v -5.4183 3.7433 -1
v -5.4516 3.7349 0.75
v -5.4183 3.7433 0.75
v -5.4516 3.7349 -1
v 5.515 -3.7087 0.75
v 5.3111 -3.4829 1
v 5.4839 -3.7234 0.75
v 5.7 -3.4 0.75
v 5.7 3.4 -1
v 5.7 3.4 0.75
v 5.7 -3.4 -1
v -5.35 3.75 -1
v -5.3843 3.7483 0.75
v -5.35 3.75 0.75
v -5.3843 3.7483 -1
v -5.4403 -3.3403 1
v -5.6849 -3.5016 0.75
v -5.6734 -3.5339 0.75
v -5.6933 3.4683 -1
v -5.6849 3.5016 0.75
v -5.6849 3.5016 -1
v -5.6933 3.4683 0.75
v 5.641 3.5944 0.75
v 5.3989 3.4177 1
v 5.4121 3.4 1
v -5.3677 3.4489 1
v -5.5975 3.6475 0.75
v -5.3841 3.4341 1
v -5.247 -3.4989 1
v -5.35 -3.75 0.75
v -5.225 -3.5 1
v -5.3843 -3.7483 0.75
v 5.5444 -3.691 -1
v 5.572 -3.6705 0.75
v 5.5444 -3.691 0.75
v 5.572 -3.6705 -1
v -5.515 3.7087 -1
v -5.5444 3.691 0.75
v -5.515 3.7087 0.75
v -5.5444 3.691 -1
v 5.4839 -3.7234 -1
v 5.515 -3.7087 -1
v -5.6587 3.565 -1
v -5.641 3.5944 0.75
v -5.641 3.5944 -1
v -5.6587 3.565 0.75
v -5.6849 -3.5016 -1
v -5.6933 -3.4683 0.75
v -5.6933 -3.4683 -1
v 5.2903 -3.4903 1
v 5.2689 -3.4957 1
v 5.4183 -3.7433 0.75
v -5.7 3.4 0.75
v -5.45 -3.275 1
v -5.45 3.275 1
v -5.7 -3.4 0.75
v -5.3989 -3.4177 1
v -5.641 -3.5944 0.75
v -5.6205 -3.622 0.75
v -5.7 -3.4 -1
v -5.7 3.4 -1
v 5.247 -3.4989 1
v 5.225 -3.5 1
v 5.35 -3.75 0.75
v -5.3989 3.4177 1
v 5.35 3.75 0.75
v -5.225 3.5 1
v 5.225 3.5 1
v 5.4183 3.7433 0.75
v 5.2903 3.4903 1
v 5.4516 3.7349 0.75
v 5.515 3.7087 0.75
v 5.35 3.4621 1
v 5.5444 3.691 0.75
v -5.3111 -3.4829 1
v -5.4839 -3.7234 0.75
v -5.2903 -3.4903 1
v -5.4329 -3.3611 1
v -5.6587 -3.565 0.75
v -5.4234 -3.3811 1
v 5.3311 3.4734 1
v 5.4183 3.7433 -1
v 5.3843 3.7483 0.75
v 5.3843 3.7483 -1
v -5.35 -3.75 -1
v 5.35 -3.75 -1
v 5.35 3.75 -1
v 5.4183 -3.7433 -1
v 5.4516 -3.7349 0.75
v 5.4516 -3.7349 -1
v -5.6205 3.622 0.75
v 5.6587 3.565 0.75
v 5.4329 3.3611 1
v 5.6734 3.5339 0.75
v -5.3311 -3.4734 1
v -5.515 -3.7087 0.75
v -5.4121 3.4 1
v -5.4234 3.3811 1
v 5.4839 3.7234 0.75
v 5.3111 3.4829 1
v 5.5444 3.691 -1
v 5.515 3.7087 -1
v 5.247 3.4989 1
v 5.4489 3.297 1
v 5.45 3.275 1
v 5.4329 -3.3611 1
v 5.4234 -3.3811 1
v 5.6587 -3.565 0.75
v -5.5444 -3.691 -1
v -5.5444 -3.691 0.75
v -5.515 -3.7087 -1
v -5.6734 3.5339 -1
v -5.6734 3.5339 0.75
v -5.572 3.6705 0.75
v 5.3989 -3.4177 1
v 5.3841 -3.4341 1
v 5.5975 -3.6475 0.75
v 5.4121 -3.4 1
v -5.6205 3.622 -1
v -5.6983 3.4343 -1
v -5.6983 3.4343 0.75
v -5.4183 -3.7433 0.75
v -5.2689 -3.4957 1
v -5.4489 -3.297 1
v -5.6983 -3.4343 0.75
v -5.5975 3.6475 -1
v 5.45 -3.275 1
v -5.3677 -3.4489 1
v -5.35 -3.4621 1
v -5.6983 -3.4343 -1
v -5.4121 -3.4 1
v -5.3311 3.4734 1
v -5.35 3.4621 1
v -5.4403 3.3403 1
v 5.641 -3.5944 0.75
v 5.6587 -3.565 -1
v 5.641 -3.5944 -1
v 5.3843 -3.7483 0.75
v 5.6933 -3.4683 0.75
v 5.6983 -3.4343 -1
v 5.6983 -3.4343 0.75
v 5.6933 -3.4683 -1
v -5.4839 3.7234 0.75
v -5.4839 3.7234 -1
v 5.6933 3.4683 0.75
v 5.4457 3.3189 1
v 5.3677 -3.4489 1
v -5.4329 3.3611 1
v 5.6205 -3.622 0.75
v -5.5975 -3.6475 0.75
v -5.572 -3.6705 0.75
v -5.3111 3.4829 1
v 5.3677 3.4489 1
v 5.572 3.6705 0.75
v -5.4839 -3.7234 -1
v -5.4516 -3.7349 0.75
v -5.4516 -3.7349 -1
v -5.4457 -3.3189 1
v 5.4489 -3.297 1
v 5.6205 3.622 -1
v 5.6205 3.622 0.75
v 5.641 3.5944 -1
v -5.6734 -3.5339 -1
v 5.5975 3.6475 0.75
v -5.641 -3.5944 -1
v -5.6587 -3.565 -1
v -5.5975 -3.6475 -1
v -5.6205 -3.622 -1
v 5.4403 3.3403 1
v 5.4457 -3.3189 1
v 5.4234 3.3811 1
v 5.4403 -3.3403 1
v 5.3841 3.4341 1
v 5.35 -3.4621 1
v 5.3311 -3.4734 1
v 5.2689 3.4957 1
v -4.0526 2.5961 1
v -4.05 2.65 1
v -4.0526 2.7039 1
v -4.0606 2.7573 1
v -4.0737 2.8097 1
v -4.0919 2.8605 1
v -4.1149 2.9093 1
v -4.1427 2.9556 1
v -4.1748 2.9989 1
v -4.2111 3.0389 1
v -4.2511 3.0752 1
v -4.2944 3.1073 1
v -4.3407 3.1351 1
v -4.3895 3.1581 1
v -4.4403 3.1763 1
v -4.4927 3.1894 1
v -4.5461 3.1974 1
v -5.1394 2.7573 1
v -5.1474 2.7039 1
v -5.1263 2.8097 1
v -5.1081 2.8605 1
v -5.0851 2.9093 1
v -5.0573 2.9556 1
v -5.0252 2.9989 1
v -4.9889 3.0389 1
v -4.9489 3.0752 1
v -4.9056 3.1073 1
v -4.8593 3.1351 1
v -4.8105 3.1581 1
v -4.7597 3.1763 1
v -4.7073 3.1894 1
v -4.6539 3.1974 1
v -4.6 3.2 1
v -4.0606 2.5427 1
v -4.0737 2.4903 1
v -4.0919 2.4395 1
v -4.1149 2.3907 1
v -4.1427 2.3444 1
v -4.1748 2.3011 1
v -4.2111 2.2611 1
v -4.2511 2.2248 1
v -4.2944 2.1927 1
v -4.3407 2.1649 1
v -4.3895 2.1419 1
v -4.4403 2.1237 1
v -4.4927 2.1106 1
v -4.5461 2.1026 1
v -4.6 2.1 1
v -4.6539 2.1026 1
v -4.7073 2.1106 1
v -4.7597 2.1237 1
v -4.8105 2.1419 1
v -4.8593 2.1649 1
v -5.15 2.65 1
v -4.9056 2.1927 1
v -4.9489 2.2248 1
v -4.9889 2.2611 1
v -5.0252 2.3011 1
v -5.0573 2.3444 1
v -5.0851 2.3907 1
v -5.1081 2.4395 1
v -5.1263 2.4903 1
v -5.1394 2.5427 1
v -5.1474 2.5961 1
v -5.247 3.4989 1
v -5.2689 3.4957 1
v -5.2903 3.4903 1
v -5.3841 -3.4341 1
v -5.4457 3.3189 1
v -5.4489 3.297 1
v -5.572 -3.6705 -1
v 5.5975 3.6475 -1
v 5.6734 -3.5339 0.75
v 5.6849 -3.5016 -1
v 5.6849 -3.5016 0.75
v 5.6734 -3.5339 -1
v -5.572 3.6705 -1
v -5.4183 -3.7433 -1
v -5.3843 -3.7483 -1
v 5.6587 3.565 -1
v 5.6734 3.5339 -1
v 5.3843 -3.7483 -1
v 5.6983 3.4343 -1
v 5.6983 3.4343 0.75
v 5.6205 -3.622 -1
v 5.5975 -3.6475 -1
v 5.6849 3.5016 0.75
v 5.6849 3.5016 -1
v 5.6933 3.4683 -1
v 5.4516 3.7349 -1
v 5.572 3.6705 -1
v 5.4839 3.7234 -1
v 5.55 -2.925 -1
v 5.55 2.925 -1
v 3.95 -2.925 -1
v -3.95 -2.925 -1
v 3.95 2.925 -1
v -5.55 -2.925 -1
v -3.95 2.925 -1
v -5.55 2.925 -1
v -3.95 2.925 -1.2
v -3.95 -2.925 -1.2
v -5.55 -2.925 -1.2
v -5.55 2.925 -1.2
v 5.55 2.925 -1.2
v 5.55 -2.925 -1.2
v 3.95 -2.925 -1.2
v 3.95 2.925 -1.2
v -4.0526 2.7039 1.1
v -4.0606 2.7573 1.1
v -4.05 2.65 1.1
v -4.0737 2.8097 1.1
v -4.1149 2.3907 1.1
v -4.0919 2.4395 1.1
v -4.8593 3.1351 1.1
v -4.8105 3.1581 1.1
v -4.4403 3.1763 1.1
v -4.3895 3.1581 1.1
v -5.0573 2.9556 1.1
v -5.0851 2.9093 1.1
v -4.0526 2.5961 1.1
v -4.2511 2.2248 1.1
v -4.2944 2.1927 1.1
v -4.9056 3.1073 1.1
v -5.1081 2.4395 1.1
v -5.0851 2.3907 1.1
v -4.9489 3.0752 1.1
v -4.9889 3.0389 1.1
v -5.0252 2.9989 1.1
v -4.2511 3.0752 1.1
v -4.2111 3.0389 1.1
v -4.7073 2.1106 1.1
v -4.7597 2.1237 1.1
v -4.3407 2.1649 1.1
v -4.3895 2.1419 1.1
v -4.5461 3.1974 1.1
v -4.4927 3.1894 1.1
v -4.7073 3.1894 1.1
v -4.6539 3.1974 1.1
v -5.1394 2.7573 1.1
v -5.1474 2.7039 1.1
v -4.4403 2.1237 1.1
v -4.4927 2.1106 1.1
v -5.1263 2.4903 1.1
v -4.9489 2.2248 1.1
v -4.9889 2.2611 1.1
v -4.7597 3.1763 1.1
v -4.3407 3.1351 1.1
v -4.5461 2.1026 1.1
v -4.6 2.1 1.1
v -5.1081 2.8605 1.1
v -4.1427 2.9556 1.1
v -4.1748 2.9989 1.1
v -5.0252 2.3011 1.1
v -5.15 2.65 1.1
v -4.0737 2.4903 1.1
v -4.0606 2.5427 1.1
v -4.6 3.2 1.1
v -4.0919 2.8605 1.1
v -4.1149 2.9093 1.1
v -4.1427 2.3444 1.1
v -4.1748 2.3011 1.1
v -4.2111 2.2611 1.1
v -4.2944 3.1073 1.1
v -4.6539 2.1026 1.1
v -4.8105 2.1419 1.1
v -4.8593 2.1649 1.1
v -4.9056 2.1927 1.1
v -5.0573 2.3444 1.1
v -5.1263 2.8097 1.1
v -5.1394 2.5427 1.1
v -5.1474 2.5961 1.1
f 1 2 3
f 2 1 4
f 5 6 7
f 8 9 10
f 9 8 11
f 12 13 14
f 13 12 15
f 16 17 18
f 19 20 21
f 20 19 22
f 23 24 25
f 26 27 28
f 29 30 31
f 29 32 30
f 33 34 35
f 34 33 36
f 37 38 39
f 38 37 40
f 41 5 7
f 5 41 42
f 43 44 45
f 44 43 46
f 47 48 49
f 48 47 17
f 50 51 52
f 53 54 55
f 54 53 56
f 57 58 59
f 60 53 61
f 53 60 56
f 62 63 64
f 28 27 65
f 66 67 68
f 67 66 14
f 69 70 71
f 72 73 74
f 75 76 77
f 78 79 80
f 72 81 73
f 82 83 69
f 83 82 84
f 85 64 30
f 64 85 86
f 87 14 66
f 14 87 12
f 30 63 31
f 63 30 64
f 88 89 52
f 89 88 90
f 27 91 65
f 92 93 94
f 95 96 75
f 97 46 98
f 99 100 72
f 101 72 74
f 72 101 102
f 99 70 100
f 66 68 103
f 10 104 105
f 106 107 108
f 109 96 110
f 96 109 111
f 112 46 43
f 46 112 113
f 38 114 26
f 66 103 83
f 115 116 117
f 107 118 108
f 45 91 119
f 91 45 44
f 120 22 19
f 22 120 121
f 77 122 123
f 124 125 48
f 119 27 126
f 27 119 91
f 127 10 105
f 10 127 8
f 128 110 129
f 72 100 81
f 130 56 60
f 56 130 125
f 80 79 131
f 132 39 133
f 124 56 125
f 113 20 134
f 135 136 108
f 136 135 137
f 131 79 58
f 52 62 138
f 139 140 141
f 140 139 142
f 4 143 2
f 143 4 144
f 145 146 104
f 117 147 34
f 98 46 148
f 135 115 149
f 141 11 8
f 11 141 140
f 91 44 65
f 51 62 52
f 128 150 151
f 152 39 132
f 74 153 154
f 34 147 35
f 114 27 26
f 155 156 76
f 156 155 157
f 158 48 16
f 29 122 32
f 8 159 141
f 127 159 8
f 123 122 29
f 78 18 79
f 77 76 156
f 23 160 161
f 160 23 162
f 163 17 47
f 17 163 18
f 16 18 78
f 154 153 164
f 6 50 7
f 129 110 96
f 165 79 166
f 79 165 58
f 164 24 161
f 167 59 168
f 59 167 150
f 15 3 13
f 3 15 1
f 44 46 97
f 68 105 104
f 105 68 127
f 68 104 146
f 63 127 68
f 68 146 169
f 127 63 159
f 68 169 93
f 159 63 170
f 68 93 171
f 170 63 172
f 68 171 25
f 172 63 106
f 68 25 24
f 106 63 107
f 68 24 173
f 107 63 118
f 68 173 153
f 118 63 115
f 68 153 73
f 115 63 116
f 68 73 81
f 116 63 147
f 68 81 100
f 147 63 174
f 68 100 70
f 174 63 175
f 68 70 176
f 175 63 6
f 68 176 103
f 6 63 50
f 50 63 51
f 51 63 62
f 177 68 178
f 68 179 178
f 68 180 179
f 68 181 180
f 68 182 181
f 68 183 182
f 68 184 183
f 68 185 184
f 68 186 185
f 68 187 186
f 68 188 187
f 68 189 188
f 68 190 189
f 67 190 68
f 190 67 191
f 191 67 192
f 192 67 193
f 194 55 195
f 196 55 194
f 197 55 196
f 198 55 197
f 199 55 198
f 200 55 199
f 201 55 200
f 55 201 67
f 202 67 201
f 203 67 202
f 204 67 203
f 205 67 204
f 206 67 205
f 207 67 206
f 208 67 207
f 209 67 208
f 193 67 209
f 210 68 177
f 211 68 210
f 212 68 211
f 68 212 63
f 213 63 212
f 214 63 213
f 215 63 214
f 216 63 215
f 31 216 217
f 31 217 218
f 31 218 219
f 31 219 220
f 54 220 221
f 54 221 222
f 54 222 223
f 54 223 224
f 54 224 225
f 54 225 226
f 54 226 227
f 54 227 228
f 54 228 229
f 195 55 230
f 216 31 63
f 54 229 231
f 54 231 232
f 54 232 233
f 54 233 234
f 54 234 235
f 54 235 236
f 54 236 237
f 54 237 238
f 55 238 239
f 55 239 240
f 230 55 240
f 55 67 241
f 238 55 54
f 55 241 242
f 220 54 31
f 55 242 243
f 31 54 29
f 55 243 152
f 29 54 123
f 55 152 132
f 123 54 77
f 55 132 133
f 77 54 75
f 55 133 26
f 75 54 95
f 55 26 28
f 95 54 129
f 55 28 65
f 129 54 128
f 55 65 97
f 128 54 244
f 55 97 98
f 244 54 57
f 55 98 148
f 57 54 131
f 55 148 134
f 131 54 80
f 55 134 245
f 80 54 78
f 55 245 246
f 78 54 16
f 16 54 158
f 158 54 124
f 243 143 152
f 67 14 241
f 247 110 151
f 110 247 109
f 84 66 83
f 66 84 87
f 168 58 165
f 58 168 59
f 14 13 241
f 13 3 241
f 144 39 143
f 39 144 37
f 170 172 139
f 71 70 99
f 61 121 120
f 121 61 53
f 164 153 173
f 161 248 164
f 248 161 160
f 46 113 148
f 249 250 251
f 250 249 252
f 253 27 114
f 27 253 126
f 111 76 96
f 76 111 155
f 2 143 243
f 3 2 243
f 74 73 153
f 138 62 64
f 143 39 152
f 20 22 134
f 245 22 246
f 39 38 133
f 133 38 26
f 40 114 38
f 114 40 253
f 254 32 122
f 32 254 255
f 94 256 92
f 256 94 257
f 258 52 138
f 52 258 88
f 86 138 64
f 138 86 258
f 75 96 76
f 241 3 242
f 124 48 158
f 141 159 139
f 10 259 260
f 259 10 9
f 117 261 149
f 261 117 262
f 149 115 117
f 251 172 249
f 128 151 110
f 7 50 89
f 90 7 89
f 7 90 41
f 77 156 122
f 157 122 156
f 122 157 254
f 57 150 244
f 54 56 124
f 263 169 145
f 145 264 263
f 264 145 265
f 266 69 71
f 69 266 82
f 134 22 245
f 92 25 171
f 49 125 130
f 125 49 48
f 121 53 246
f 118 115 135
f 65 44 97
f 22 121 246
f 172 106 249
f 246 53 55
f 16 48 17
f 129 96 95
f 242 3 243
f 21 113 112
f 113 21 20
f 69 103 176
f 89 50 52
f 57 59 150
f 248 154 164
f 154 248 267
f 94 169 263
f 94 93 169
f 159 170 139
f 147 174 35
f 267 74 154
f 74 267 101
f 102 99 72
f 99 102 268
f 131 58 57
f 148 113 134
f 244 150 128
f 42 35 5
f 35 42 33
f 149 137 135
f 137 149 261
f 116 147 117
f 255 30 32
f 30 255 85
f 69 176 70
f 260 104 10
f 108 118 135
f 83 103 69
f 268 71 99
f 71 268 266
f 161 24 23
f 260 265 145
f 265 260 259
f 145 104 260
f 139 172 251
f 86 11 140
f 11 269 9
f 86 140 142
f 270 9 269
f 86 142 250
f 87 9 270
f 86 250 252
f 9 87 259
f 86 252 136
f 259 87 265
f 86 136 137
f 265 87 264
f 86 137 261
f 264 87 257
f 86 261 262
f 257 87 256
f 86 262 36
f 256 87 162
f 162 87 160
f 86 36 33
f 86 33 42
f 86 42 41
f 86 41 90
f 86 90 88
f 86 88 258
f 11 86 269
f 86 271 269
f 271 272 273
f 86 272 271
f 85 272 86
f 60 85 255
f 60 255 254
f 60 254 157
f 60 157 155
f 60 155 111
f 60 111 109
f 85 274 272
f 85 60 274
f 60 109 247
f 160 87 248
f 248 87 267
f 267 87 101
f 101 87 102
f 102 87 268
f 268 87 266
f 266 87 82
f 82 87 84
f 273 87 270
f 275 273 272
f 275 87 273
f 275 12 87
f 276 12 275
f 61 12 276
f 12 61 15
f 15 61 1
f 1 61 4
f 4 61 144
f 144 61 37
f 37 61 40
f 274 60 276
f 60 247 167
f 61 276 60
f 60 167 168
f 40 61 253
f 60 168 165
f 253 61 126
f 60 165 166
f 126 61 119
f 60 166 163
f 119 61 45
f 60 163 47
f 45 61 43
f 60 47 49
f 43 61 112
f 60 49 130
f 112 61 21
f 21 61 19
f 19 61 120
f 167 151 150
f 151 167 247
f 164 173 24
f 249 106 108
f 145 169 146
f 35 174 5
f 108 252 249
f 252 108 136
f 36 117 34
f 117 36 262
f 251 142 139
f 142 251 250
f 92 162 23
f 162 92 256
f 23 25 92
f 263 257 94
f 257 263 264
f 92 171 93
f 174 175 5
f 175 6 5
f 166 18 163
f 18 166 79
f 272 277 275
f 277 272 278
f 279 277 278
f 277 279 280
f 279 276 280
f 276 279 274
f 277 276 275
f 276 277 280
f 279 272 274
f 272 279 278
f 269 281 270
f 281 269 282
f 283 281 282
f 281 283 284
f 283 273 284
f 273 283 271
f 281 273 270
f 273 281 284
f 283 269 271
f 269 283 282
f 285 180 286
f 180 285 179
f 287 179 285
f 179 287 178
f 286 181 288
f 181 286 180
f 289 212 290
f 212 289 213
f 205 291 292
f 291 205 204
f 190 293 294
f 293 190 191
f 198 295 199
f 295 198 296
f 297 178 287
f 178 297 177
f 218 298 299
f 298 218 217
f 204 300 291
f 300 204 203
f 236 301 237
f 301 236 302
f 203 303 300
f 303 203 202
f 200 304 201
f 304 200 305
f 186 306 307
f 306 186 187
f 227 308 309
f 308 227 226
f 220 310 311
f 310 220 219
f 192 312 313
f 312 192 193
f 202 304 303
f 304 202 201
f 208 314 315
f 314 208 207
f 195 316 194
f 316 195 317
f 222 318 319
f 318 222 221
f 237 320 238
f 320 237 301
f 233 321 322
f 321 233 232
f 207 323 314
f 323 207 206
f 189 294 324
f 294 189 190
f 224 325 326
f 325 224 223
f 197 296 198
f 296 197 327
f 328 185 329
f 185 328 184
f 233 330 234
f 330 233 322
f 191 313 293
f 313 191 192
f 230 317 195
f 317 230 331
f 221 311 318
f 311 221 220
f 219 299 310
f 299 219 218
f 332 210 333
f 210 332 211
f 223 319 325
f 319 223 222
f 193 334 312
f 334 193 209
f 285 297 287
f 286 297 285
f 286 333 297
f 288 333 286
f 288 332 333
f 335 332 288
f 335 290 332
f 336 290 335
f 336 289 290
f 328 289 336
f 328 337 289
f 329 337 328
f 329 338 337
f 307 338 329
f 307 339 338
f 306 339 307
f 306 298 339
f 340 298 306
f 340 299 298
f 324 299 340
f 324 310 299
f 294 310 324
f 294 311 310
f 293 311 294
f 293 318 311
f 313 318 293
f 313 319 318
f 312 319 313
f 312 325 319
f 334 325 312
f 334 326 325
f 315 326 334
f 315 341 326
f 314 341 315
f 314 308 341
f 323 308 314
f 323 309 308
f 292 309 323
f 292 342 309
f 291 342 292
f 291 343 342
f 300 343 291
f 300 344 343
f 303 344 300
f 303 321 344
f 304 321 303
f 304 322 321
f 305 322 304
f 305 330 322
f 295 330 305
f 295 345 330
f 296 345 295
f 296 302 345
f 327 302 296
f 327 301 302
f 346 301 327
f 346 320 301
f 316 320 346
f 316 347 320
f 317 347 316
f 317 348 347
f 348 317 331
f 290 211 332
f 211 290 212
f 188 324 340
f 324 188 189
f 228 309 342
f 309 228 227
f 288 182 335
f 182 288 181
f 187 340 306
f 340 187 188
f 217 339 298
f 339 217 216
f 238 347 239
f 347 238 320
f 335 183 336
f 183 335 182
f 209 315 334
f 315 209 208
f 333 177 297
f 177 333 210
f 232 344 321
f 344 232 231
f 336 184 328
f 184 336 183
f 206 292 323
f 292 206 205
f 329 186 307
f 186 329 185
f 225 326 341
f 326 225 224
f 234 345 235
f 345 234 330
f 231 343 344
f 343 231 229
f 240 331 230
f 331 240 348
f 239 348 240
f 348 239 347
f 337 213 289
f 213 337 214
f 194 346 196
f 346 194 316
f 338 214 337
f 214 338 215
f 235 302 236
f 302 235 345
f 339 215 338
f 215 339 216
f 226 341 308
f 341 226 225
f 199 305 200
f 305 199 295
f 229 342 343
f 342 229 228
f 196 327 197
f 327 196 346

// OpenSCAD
$fn = 64;

// Target overall size (mm)
body_length = 11.40;
body_width  = 7.50;
body_height = 2.00;

// Feature parameters (kept proportional and connected)
edge_round_r   = 0.35;   // corner rounding for body
top_chamfer_h  = 0.25;   // slight top taper
pin1_mark_r    = 0.55;
pin1_mark_h    = 0.18;
pin1_inset_xy  = 1.10;   // from outer edges
overlap        = 0.05;   // small overlap to guarantee single connected solid

// Simple SMD terminals (as bottom pads)
pad_len   = 1.60;
pad_thk   = 0.20;
pad_inset = 0.15;        // inset from body ends

module rounded_box_xy(l, w, h, r) {
    // Rounded rectangle in XY, extruded in Z
    linear_extrude(height=h, center=true)
        offset(r=r)
            square([l - 2*r, w - 2*r], center=true);
}

module smd_body() {
    // Slight top taper via hull of two rounded boxes
    color("DimGray")
    hull() {
        translate([0,0,-top_chamfer_h/2])
            rounded_box_xy(body_length, body_width, body_height - top_chamfer_h, edge_round_r);

        translate([0,0, body_height/2 - top_chamfer_h/2])
            rounded_box_xy(body_length - 2*top_chamfer_h,
                           body_width  - 2*top_chamfer_h,
                           top_chamfer_h,
                           max(0.01, edge_round_r - top_chamfer_h/2));
    }
}

module pad_at_end(sign) { // sign = -1 (left), +1 (right)
    // Pads are connected to body by slight overlap into the body bottom
    color("Silver")
    translate([
        sign * (body_length/2 - pad_inset - pad_len/2),
        0,
        -body_height/2 - pad_thk/2 + overlap
    ])
        cube([pad_len, body_width*0.78, pad_thk + 2*overlap], center=true);
}

module pin1_mark() {
    // Small top mark near one corner, connected with overlap
    color("Silver")
    translate([
        -body_length/2 + pin1_inset_xy,
         body_width/2  - pin1_inset_xy,
         body_height/2 - pin1_mark_h/2 + overlap
    ])
        cylinder(r=pin1_mark_r, h=pin1_mark_h + 2*overlap, center=true);
}

union() {
    smd_body();
    pad_at_end(-1);
    pad_at_end( 1);
    pin1_mark();
}
